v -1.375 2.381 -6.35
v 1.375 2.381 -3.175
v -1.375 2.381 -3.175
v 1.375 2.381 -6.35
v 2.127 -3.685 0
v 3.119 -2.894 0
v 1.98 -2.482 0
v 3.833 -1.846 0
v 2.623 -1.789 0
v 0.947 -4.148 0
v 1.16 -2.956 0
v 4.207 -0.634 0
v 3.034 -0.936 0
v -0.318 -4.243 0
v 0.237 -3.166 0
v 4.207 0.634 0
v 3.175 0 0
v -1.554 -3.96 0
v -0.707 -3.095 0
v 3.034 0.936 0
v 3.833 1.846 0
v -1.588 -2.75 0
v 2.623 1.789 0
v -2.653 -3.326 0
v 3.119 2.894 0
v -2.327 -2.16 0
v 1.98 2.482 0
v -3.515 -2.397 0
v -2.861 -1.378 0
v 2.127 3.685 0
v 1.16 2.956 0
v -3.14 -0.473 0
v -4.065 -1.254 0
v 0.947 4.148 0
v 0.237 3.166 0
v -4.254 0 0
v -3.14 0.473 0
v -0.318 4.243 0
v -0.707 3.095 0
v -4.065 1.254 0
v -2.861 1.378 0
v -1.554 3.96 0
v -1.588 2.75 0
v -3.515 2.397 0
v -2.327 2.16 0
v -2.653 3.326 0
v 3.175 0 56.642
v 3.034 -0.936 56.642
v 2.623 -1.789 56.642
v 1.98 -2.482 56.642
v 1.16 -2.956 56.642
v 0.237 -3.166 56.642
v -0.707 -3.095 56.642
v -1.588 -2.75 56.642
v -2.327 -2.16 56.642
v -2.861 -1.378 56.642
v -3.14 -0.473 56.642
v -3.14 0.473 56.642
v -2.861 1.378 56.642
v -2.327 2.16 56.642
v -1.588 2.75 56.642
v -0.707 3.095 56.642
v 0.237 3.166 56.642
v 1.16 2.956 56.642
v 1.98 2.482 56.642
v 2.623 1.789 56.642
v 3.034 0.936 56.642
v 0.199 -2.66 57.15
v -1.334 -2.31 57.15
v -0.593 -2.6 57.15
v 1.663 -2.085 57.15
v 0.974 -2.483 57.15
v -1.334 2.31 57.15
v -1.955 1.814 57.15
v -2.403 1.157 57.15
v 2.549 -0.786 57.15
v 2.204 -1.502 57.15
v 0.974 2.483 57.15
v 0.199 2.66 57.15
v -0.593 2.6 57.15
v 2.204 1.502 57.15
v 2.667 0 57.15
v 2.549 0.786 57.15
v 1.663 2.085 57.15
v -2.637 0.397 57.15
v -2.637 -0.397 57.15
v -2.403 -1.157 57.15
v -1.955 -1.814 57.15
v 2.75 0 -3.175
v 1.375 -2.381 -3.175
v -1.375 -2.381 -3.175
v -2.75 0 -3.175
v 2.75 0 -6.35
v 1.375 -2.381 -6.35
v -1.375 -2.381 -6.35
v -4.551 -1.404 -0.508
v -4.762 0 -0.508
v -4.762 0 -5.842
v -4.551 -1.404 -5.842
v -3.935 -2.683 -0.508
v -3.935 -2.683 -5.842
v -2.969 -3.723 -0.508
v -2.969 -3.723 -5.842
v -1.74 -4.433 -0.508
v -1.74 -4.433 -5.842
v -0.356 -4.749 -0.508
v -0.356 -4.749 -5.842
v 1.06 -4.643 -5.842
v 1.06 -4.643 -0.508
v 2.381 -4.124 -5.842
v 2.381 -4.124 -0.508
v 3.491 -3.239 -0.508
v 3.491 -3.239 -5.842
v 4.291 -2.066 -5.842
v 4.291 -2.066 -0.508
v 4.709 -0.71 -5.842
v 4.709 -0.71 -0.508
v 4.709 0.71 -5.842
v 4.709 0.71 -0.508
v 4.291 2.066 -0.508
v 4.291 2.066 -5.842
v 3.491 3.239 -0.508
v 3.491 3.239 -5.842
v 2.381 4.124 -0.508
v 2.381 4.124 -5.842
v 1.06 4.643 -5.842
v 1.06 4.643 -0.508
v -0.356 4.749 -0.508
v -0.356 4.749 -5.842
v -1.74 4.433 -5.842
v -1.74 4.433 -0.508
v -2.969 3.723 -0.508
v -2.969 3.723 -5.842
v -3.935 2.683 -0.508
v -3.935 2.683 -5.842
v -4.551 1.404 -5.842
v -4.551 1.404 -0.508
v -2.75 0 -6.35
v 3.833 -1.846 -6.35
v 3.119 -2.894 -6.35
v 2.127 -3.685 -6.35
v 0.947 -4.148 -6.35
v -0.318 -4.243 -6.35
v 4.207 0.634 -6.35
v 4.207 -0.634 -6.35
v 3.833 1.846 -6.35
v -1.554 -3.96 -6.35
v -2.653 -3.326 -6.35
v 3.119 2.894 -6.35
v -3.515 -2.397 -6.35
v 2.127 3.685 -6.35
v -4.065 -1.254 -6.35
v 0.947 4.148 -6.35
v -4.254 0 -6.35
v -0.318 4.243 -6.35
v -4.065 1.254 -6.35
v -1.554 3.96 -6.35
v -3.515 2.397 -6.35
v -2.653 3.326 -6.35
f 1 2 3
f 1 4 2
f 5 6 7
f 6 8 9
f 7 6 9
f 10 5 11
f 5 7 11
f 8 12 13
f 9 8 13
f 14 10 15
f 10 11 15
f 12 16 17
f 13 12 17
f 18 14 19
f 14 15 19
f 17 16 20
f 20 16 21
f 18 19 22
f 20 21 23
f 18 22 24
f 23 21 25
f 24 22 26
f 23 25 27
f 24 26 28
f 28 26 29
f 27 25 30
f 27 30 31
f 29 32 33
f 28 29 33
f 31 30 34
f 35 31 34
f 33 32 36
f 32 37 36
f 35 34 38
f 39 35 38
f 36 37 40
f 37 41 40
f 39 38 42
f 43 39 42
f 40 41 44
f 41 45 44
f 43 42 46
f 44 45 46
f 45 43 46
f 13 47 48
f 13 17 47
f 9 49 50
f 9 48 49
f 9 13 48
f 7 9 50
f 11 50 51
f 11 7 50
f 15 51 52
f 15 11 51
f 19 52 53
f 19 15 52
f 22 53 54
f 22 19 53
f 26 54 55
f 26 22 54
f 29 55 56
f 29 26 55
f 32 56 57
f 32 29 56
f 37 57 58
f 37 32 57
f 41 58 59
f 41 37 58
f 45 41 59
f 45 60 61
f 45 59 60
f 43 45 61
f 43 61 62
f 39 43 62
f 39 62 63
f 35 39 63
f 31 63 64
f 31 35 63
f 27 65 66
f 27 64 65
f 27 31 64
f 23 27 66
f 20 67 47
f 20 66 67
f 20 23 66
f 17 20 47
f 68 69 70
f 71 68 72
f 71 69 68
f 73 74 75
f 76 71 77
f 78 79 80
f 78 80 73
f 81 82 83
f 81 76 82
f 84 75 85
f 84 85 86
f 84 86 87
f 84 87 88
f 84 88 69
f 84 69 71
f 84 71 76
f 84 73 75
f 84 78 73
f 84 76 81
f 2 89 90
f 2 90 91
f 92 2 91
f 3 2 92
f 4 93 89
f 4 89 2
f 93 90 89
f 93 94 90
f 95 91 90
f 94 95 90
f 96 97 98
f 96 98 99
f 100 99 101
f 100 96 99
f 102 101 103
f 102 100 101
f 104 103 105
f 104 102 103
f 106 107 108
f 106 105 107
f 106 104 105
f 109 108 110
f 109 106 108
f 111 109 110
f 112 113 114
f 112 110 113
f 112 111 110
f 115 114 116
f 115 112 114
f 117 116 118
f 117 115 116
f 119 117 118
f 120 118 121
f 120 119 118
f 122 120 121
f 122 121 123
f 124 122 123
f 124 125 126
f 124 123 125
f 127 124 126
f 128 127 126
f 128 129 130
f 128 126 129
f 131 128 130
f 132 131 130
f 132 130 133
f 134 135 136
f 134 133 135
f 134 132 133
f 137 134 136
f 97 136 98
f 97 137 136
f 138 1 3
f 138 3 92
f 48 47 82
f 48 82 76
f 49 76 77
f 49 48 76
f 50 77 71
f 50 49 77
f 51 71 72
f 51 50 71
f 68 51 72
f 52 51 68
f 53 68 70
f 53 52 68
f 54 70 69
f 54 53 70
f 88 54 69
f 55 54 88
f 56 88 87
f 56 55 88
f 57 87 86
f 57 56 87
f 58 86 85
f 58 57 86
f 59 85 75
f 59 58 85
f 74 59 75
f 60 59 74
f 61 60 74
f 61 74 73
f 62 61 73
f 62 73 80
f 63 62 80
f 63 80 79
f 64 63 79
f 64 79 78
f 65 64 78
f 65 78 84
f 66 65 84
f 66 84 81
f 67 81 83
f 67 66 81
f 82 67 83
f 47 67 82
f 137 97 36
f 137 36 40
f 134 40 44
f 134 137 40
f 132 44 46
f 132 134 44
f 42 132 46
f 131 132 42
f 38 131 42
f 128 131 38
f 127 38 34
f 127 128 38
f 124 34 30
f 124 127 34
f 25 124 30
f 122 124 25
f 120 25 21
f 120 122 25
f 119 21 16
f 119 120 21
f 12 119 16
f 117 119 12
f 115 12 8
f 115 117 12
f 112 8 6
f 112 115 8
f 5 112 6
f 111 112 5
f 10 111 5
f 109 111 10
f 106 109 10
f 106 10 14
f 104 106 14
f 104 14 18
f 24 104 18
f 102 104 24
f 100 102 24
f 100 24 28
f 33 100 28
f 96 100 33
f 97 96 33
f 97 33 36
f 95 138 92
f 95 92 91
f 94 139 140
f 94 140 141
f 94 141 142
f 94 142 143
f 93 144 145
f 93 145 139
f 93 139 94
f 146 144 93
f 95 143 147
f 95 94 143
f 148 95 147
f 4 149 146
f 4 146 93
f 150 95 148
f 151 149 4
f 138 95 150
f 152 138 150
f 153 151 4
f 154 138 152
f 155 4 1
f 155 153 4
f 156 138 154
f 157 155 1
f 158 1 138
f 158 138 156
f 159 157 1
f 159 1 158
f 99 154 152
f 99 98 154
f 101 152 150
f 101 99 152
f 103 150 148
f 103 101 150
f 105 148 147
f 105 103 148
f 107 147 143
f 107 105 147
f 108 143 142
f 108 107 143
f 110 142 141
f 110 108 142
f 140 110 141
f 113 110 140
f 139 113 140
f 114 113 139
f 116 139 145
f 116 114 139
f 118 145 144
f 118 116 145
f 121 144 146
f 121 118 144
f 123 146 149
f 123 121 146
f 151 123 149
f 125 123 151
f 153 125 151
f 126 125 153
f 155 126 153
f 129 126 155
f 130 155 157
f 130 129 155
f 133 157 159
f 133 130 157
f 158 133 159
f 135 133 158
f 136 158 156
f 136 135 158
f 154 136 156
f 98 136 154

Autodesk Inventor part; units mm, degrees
ref_plane "YZ Plane" through (0, 0, 0) normal (1, 0, 0) x (0, 1, 0)
ref_plane "XZ Plane" through (0, 0, 0) normal (0, 1, 0) x (-1, 0, 0)
ref_plane "XY Plane" through (0, 0, 0) normal (0, 0, 1) x (1, 0, 0)
sketch "Sketch1" plane through (0, 0, 0) normal (0, 0, 1) x (1, 0, 0)
  circle A0 centre (0, 0) radius 3.175
  dimension "d0" = 6.35
extrude "Extrusion1" add sketch "Sketch1" along normal blind 57.15
sketch "Sketch2" plane through (0, 0, 0) normal (0, 0, -1) x (-1, 0, 0)
  circle A0 centre (0, 0) radius 3.175 projected
  circle A1 centre (0, 0) radius 4.7625
  dimension "d3" = 9.525
extrude "Extrusion2" add sketch "Sketch2" along normal blind 6.35 contours A0 | A1
sketch "Sketch3" plane through (0, 0, -6.35) normal (0, 0, -1) x (-1, 0, 0)
  circle A0 centre (0, 0) radius 4.7625 projected
  line L0 (-1.3748, 2.3812) -> (1.3748, 2.3813)
  line L1 (1.3748, 2.3813) -> (2.7496, 0)
  line L2 (2.7496, 0) -> (1.3748, -2.3812)
  line L3 (1.3748, -2.3812) -> (-1.3748, -2.3812)
  line L4 (-1.3748, -2.3812) -> (-2.7496, 0)
  line L5 (-2.7496, 0) -> (-1.3748, 2.3812)
  dimension "d6" = 4.7625
extrude "Extrusion3" cut sketch "Sketch3" against normal blind 3.175 contours L0 L1 L2 L3 L4 L5
chamfer "Chamfer1" distance 0.508 angle 45 3 edges at (-3.175, 0, 57.15) (4.7625, 0, 0) (4.7625, 0, -6.35)
thread "Thread1" size "1/4-20 UNC" class "2A" standard "ANSI Unified Screw Threads" length 25.4
properties part number "14-20 x2500" material "Steel"
